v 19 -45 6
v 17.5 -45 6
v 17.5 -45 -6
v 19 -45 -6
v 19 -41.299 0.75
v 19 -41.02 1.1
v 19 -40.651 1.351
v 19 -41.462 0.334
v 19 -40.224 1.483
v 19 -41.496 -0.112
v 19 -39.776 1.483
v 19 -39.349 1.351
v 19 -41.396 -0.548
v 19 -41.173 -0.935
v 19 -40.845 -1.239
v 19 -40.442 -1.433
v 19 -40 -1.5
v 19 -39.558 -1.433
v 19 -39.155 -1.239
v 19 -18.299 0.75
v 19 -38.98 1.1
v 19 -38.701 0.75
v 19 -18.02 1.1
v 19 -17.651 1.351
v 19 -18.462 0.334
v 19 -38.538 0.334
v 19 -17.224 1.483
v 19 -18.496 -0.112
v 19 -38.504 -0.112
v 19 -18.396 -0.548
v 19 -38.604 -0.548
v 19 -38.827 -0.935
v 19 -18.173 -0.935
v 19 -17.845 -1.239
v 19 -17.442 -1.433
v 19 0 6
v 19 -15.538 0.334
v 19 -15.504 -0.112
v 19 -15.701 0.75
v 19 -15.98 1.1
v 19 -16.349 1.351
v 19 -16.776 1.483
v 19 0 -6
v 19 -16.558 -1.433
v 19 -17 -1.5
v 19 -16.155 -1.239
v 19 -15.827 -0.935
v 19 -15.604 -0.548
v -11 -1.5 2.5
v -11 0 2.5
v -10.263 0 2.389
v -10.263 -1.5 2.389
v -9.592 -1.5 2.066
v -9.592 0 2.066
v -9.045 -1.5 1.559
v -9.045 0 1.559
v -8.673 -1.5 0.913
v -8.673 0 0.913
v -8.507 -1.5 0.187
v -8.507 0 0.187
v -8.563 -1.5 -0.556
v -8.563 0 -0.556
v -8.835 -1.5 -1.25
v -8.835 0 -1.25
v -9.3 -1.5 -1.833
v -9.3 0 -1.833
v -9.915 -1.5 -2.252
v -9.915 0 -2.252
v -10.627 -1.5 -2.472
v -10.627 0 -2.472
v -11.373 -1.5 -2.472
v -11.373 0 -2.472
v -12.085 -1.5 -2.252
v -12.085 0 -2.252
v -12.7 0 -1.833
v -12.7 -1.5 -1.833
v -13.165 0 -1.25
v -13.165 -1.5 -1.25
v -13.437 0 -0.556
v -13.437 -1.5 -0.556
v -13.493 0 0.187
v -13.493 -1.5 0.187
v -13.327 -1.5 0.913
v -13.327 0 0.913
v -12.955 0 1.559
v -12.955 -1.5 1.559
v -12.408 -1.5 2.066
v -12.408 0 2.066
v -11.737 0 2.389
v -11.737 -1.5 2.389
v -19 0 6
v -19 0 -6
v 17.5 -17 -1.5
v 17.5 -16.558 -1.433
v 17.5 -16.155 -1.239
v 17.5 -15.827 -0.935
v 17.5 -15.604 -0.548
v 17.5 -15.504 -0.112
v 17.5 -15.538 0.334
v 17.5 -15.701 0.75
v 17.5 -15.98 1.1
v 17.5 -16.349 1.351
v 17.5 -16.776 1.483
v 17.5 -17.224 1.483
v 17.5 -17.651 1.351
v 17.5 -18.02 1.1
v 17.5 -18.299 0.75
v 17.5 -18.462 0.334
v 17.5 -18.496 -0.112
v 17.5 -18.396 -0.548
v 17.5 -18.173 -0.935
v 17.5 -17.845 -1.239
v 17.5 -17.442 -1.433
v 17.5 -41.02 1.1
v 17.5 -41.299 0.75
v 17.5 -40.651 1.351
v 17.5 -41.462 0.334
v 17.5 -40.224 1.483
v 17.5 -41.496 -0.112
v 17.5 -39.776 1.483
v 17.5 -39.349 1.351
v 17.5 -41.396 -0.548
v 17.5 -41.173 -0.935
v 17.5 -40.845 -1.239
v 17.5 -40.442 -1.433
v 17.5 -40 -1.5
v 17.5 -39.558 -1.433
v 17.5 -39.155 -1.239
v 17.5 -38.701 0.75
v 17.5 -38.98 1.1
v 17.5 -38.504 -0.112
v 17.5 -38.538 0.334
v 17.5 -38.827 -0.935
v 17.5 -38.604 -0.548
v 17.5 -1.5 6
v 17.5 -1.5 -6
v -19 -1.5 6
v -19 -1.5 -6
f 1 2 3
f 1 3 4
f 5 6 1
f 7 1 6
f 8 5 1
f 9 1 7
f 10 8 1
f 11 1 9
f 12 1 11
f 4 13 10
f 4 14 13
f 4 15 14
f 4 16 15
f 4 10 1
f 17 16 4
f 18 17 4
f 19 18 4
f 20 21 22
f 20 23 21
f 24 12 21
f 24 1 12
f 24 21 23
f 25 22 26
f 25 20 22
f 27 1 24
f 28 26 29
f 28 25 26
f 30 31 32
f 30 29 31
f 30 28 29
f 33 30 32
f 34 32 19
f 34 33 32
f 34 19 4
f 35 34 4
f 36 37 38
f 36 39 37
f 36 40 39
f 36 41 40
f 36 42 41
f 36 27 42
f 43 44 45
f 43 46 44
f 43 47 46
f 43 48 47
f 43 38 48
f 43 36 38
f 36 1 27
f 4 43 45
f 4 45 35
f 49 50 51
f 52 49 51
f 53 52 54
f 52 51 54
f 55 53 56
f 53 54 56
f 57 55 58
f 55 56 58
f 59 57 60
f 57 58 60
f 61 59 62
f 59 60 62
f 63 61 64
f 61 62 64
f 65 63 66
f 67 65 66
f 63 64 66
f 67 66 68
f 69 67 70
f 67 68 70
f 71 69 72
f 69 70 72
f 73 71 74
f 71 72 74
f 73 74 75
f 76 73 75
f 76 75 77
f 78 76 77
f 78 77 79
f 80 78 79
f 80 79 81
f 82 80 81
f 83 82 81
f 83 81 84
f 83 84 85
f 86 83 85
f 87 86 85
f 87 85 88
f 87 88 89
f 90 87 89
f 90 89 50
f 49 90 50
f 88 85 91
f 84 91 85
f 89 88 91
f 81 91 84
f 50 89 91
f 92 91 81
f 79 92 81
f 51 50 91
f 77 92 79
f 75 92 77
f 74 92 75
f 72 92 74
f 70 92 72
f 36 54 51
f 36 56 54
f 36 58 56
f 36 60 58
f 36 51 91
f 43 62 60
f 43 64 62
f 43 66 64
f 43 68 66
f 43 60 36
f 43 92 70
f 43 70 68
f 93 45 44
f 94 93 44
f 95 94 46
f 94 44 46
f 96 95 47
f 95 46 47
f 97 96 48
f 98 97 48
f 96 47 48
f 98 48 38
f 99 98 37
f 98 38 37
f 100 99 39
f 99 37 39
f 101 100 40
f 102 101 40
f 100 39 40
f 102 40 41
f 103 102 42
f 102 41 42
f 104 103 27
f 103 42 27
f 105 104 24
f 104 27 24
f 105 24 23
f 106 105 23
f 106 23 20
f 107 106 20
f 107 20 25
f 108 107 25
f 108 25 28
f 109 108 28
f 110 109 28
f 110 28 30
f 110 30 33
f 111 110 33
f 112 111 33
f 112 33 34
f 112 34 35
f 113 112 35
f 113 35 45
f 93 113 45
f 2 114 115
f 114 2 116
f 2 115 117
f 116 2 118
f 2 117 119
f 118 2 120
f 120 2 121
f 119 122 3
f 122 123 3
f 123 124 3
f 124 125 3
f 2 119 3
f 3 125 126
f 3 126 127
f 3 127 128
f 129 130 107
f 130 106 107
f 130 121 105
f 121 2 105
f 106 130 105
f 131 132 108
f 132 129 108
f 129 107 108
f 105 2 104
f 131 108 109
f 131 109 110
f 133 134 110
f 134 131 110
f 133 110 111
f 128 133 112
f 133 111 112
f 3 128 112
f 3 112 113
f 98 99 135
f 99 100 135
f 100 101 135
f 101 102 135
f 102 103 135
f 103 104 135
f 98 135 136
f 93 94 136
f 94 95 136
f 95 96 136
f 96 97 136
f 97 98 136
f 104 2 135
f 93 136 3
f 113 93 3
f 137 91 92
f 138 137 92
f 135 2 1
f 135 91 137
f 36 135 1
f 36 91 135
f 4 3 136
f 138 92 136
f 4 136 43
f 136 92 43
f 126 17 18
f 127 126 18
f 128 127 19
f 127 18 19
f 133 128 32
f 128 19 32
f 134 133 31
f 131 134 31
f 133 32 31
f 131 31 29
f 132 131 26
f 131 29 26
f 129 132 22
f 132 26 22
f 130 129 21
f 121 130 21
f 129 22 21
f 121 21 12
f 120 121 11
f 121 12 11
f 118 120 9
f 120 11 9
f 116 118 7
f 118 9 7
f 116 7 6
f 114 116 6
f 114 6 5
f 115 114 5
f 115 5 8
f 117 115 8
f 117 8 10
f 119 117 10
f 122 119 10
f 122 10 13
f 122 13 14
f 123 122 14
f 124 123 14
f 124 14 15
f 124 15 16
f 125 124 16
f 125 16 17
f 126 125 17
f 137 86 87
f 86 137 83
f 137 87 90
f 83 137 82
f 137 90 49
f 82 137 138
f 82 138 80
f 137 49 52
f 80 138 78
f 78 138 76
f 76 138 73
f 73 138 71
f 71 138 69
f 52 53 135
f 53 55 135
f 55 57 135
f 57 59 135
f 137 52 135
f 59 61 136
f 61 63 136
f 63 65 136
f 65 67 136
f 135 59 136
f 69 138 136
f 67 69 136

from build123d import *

# Parameters (mm, degrees)
SKETCH1_W           = 36.5
SKETCH1_H           = 12
BOSS_EXTRUDE1_DEPTH = 1.5
SKETCH1_3_W         = 1.5
SKETCH1_3_H         = 12
BOSS_EXTRUDE2_DEPTH = 45
SKETCH2_R           = 1.5
CUT_EXTRUDE1_DEPTH  = 60.203040462
SKETCH3_R           = 2.5
CUT_EXTRUDE2_DEPTH  = 30


with BuildPart() as part:
    # Sketch1 → Boss-Extrude1 (new body)
    with BuildSketch(Plane(origin=(0, 0, 0), x_dir=(1, 0, 0), z_dir=(0, 1, 0))):
        with Locations((-0.75, 0)):
            Rectangle(SKETCH1_W, SKETCH1_H)
    extrude(amount=-BOSS_EXTRUDE1_DEPTH)

    # Sketch1<3> → Boss-Extrude2 (add)
    with BuildSketch(Plane(origin=(0, 0, 0), x_dir=(1, 0, 0), z_dir=(0, 1, 0))):
        with Locations((18.25, 0)):
            Rectangle(SKETCH1_3_W, SKETCH1_3_H)
    extrude(amount=-BOSS_EXTRUDE2_DEPTH)

    # Sketch2 → Cut-Extrude1 (cut, through all)
    with BuildSketch(Plane(origin=(19, 0, 0), x_dir=(0, 0, -1), z_dir=(1, 0, 0))):
        with Locations((0, -40)):
            Circle(SKETCH2_R)
        with Locations((0, -17)):
            Circle(SKETCH2_R)
    extrude(amount=-CUT_EXTRUDE1_DEPTH, mode=Mode.SUBTRACT)

    # Sketch3 → Cut-Extrude2 (cut)
    with BuildSketch(Plane(origin=(0, 0, 0), x_dir=(1, 0, 0), z_dir=(0, 1, 0))):
        with Locations((-11, 0)):
            Circle(SKETCH3_R)
    extrude(amount=-CUT_EXTRUDE2_DEPTH, mode=Mode.SUBTRACT)


solid = part.part
